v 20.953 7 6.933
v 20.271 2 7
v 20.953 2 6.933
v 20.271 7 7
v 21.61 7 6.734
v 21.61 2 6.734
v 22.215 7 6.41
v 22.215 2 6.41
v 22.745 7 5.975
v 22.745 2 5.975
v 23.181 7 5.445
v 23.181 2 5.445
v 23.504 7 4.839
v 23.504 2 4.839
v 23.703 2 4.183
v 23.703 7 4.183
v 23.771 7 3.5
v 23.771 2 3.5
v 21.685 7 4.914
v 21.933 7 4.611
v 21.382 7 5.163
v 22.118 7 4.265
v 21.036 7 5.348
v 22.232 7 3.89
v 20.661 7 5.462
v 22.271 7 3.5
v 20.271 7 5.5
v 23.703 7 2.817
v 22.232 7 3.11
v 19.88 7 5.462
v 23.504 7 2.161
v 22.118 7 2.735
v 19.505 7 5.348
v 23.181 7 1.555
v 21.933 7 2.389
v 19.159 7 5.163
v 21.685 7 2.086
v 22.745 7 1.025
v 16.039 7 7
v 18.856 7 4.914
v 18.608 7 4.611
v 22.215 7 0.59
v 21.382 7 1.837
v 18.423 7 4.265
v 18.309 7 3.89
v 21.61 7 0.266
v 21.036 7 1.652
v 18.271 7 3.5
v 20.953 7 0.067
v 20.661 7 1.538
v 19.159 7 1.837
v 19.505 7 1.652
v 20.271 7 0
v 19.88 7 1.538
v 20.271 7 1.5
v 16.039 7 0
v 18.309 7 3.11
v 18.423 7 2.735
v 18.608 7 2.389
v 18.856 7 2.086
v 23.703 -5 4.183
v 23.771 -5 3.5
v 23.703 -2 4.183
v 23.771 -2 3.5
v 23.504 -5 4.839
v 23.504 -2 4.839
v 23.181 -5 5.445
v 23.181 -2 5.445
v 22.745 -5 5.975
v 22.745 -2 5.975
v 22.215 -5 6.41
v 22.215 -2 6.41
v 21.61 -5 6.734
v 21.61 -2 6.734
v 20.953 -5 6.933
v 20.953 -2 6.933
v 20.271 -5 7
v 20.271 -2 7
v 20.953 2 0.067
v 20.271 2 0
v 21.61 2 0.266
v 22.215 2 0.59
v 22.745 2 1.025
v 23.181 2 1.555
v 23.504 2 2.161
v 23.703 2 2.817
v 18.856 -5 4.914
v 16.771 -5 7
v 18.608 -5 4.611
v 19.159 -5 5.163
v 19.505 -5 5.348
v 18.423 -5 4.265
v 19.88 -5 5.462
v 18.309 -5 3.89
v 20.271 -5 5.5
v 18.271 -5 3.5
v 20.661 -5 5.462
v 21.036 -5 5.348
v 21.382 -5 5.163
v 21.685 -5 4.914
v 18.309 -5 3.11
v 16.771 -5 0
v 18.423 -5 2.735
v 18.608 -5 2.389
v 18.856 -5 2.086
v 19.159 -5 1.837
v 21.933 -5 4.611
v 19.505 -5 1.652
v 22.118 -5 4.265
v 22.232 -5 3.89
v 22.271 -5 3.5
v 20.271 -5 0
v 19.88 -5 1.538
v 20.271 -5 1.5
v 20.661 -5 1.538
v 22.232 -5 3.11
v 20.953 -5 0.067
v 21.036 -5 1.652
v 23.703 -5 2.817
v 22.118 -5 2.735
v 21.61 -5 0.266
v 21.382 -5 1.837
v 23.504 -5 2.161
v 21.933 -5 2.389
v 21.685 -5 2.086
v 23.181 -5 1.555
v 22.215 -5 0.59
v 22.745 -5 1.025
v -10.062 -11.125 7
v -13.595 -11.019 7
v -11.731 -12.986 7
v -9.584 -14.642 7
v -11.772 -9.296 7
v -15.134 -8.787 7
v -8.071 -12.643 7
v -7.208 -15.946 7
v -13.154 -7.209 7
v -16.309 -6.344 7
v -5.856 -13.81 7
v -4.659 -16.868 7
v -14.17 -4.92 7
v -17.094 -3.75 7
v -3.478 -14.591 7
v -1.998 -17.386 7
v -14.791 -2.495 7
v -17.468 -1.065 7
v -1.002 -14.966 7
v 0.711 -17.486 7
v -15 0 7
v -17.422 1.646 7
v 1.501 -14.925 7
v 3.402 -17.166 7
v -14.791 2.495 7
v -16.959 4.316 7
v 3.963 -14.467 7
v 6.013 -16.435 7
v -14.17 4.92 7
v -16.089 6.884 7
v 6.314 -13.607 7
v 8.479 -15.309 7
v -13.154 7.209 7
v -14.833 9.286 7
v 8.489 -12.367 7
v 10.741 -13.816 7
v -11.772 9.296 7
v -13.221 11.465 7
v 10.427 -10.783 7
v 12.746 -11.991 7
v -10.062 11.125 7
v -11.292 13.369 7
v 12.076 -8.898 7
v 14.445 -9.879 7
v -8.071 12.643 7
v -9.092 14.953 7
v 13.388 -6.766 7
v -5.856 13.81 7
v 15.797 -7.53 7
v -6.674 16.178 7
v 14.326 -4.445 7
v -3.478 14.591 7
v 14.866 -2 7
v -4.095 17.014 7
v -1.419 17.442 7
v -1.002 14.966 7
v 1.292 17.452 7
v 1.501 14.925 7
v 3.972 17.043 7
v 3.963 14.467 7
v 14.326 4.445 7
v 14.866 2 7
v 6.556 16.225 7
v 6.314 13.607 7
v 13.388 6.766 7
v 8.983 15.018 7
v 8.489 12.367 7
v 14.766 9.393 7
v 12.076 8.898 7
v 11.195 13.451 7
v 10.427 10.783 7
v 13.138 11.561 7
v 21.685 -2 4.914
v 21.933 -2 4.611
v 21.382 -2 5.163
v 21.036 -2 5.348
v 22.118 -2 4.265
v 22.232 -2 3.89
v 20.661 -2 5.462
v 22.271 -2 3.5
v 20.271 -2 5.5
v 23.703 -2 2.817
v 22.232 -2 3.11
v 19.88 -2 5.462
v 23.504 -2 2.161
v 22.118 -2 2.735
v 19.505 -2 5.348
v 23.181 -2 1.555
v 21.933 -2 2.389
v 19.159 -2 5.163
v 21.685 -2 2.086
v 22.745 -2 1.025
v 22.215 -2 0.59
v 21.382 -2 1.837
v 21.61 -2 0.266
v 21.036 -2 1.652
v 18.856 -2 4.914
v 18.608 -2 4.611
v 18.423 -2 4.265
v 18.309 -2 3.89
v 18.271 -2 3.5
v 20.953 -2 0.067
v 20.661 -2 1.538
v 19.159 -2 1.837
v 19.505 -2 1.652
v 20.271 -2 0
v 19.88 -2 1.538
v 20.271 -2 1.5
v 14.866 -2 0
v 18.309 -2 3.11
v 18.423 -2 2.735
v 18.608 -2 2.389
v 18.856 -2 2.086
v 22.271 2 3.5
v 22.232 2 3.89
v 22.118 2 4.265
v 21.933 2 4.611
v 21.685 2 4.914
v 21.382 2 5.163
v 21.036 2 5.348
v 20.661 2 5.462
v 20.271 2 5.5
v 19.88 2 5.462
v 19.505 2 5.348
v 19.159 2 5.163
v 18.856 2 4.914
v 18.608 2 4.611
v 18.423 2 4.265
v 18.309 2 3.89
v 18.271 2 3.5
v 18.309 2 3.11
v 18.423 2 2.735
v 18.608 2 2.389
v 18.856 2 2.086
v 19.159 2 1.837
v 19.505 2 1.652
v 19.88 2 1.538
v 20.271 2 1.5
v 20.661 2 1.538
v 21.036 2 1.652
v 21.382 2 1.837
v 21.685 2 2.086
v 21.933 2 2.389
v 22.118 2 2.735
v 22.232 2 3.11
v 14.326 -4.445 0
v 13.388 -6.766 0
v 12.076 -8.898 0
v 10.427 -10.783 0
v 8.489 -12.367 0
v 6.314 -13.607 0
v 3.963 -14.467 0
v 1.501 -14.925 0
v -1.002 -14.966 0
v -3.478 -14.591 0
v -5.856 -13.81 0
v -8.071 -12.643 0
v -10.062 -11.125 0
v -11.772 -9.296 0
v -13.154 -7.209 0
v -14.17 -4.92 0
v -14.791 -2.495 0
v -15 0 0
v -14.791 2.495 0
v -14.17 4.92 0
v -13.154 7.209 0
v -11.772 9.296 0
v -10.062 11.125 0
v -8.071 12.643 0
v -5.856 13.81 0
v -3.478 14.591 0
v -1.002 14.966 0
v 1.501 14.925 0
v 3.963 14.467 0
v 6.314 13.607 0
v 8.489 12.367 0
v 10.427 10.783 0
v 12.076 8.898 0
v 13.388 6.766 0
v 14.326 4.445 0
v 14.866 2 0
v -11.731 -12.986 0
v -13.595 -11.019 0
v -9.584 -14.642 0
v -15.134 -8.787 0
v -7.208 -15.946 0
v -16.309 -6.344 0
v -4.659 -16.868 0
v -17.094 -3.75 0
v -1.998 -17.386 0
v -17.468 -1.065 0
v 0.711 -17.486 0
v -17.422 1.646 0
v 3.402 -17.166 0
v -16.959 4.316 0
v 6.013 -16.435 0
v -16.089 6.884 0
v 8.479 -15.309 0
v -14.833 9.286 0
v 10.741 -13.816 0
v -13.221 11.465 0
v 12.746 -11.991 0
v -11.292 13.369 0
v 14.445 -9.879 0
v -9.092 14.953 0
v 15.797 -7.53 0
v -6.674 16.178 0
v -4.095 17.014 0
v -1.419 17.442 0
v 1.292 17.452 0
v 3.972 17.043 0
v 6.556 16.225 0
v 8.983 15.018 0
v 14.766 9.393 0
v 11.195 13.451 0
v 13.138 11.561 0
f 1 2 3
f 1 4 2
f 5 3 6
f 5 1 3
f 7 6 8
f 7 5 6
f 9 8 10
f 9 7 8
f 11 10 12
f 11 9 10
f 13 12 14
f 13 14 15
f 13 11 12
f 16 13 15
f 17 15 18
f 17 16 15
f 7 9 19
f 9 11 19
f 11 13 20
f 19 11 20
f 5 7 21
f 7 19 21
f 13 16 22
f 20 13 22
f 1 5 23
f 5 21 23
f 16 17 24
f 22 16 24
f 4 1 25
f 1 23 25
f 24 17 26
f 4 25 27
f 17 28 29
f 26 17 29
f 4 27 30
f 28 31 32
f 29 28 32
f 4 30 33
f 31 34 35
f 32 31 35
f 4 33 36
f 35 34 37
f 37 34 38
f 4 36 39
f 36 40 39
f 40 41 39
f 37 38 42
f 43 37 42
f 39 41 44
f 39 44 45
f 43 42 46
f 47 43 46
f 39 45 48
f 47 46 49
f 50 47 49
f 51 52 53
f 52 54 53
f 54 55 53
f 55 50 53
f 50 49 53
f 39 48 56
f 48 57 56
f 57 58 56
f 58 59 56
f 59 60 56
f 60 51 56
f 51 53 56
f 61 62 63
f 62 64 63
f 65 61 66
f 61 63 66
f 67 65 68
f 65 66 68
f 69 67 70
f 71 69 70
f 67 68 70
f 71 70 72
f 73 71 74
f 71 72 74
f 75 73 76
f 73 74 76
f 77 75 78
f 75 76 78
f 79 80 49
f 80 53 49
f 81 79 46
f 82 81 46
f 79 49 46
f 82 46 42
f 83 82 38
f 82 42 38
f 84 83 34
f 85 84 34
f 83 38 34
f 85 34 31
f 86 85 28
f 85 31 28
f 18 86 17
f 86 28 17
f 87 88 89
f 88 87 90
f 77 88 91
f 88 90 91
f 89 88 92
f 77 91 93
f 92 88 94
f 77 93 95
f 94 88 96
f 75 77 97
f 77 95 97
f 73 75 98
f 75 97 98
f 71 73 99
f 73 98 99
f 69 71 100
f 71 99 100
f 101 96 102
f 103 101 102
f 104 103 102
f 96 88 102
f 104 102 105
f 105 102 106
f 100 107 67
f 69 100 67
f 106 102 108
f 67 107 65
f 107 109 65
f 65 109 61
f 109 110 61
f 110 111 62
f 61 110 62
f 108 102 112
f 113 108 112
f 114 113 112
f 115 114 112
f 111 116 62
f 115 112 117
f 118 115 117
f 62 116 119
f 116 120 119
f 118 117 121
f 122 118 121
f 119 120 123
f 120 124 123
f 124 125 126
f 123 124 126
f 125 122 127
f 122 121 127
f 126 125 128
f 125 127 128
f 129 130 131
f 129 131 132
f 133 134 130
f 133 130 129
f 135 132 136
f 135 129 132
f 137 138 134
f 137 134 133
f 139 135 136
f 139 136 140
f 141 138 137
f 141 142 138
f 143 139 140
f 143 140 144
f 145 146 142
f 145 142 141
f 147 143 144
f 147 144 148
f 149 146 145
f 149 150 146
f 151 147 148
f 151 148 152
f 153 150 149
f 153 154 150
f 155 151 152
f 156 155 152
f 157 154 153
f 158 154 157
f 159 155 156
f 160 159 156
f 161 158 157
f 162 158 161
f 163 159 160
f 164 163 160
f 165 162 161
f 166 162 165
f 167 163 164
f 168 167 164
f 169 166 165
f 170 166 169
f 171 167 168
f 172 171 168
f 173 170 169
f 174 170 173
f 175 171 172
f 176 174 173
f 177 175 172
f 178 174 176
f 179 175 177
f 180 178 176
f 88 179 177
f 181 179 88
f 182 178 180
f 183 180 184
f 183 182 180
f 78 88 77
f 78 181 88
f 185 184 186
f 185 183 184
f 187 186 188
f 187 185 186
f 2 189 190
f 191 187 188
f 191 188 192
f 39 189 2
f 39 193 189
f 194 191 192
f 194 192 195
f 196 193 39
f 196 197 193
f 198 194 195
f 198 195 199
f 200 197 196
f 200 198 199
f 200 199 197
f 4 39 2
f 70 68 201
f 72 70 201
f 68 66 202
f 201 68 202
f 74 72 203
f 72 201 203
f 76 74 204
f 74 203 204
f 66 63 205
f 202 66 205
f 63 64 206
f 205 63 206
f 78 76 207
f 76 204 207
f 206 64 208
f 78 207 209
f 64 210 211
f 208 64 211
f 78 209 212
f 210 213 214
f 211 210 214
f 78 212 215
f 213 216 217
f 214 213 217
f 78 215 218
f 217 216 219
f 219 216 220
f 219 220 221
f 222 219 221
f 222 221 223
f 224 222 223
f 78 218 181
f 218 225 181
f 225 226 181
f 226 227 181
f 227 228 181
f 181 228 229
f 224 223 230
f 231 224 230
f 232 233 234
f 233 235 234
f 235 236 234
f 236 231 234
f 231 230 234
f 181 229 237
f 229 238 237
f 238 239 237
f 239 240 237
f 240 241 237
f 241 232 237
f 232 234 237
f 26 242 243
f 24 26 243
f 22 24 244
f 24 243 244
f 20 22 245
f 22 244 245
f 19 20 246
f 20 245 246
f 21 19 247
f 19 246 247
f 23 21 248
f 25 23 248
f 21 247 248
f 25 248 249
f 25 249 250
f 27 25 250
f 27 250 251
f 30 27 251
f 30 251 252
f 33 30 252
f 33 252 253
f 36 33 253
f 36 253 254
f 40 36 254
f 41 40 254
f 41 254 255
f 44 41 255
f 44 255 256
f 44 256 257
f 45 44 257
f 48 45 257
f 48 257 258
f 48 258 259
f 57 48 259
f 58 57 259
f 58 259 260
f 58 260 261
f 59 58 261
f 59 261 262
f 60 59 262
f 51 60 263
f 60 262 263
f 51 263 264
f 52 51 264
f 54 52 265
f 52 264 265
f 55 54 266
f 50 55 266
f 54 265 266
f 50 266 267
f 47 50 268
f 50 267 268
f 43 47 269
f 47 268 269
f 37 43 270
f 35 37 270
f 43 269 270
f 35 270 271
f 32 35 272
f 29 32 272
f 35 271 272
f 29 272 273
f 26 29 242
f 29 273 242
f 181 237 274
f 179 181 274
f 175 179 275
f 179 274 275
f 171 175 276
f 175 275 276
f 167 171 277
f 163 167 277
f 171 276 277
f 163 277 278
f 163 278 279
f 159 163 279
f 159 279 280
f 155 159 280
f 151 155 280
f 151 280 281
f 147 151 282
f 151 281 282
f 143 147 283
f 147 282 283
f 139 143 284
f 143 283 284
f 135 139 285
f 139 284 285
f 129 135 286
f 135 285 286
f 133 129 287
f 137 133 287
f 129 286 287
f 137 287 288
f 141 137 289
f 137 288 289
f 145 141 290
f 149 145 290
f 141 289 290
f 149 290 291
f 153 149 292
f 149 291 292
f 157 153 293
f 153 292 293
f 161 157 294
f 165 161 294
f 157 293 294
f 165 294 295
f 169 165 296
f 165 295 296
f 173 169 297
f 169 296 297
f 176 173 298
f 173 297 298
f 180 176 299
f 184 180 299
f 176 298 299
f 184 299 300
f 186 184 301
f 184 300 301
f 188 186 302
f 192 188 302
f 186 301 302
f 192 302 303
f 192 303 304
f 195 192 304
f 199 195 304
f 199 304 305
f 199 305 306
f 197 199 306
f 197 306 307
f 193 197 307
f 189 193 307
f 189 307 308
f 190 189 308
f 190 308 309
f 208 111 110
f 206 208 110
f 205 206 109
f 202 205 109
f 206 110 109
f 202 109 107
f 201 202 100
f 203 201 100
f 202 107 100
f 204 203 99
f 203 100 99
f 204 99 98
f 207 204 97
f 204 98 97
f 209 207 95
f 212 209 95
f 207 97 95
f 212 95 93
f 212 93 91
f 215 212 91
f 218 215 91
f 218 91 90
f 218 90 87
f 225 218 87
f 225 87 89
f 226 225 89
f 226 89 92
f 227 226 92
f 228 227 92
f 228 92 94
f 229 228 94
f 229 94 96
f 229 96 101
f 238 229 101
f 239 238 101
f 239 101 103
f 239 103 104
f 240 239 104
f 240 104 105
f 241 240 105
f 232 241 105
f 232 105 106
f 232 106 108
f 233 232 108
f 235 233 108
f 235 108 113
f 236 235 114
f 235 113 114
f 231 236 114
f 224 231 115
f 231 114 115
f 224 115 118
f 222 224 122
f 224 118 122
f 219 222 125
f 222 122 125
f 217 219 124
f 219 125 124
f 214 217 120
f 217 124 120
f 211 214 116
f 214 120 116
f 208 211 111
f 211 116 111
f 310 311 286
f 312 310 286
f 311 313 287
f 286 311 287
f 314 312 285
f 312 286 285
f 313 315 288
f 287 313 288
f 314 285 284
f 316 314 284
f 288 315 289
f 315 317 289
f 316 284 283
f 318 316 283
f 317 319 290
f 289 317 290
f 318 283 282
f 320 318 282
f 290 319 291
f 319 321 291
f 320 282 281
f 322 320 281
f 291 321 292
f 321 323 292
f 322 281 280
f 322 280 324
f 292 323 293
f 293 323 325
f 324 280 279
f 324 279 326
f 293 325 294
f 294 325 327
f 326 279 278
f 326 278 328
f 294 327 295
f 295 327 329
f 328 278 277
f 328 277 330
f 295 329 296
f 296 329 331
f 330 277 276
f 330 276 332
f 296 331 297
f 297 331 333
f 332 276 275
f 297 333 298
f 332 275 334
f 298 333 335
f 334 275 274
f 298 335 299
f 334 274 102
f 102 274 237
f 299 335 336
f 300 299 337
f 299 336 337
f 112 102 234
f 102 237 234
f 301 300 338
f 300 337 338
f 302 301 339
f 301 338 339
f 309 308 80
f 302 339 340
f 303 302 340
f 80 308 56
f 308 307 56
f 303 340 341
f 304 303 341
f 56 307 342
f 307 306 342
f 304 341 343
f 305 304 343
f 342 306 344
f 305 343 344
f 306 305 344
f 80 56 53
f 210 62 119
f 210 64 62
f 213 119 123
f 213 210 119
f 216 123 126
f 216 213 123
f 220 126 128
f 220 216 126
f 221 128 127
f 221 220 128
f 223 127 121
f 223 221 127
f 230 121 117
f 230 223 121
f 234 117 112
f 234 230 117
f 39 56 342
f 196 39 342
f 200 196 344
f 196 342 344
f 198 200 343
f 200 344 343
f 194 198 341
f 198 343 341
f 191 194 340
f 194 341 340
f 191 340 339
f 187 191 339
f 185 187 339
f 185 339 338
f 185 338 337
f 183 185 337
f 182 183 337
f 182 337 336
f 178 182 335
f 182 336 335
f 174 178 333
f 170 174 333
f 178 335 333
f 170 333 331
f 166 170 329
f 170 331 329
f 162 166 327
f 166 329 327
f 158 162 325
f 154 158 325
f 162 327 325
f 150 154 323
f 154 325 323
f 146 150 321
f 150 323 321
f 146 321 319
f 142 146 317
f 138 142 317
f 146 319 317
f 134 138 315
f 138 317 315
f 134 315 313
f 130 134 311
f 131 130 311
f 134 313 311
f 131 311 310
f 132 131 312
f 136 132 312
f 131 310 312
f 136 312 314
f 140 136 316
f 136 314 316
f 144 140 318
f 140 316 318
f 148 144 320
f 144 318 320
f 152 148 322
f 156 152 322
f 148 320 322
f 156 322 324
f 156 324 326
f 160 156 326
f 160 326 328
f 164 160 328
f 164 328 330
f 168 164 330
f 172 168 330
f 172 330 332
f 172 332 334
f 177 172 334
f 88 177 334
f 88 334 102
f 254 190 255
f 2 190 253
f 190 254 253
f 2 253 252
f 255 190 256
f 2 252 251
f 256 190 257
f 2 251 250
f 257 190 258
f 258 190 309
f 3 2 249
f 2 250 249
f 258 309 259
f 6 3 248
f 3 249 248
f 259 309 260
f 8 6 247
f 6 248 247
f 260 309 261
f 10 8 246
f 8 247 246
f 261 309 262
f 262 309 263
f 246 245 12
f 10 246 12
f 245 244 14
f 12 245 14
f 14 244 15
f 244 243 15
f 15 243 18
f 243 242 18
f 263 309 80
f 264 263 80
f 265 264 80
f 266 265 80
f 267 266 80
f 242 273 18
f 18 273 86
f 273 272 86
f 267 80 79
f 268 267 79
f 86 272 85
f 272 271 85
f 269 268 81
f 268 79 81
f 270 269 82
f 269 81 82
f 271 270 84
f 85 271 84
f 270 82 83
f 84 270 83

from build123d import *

# Parameters (mm, degrees)
F0_W     = 7
F0_H     = 2
F1_DEPTH = 7
F2_R     = 2
F3_DEPTH = 25
F4_R     = 3.49999


# Not quite as in the source:
# - a fillet or chamfer is up to 0.001 mm smaller than in the source, because OpenCascade refuses the exact size


with BuildPart() as f1:
    # F0 (on Top) → F1 (new body)
    with BuildSketch(Plane.XY):
        with BuildLine():
            ThreePointArc((14.8660687473, -2), (-15, 0), (14.8660687473, 2))
            Line((14.8660687473, 2), (16.7705098312, 2))
            Line((16.7705098312, 2), (16.7705098312, 5))
            Line((16.7705098312, 5), (16.0390149323, 5))
            Line((16.0390149323, 5), (16.0390149323, 7))
            ThreePointArc((16.0390149323, 7), (-17.4675765006, -1.0647869255), (16.7705098312, -5))
            Line((16.7705098312, -5), (16.7705098312, -2))
            Line((16.7705098312, -2), (14.8660687473, -2))
        make_face()
        with BuildLine():
            Line((16.7705098312, 5), (16.7705098312, 2))
            Line((16.7705098312, 2), (17.3853386507, 2))
            ThreePointArc((17.3853386507, 2), (17.1436721965, 3.5134745793), (16.7705098312, 5))
        make_face()
        with BuildLine():
            ThreePointArc((16.7705098312, 5), (17.1436721965, 3.5134745793), (17.3853386507, 2))
            Line((17.3853386507, 2), (23.7705098312, 2))
            Line((23.7705098312, 2), (23.7705098312, 5))
            Line((23.7705098312, 5), (16.7705098312, 5))
        make_face()
        with BuildLine():
            Line((23.7705098312, -2), (17.3853386507, -2))
            ThreePointArc((17.3853386507, -2), (17.1436721965, -3.5134745793), (16.7705098312, -5))
            Line((16.7705098312, -5), (23.7705098312, -5))
            Line((23.7705098312, -5), (23.7705098312, -2))
        make_face()
        with BuildLine():
            Line((17.3853386507, -2), (16.7705098312, -2))
            Line((16.7705098312, -2), (16.7705098312, -5))
            ThreePointArc((16.7705098312, -5), (17.1436721965, -3.5134745793), (17.3853386507, -2))
        make_face()
        with Locations((20.2705098312, 6)):
            Rectangle(F0_W, F0_H)
        with BuildLine():
            Line((16.0390149323, 5), (16.7705098312, 5))
            ThreePointArc((16.7705098312, 5), (16.4352130745, 6.0111372632), (16.0390149323, 7))
            Line((16.0390149323, 7), (16.0390149323, 5))
        make_face()
        with BuildLine():
            ThreePointArc((16.0390149323, 7), (16.4352130745, 6.0111372632), (16.7705098312, 5))
            Line((16.7705098312, 5), (16.7705098312, 7))
            Line((16.7705098312, 7), (16.0390149323, 7))
        make_face()
    extrude(amount=F1_DEPTH)

    # F2 (on face) → F3 (cut)
    with BuildSketch(Plane.XZ.offset(5)):
        with Locations((20.2705098312, 3.5)):
            Circle(F2_R)
    extrude(amount=-F3_DEPTH, mode=Mode.SUBTRACT)

    # F4 (radius 3.5 in the source; OpenCascade refuses exactly that, so slightly less here)
    f4_edges = [f1.edges().sort_by_distance(p)[0] for p in [
        (23.77051, -3.5, 7),
        (23.77051, 4.5, 7),
        (23.77051, -3.5, 0),
        (23.77051, 4.5, 0),
    ]]
    fillet(f4_edges, radius=F4_R)


solid = f1.part
